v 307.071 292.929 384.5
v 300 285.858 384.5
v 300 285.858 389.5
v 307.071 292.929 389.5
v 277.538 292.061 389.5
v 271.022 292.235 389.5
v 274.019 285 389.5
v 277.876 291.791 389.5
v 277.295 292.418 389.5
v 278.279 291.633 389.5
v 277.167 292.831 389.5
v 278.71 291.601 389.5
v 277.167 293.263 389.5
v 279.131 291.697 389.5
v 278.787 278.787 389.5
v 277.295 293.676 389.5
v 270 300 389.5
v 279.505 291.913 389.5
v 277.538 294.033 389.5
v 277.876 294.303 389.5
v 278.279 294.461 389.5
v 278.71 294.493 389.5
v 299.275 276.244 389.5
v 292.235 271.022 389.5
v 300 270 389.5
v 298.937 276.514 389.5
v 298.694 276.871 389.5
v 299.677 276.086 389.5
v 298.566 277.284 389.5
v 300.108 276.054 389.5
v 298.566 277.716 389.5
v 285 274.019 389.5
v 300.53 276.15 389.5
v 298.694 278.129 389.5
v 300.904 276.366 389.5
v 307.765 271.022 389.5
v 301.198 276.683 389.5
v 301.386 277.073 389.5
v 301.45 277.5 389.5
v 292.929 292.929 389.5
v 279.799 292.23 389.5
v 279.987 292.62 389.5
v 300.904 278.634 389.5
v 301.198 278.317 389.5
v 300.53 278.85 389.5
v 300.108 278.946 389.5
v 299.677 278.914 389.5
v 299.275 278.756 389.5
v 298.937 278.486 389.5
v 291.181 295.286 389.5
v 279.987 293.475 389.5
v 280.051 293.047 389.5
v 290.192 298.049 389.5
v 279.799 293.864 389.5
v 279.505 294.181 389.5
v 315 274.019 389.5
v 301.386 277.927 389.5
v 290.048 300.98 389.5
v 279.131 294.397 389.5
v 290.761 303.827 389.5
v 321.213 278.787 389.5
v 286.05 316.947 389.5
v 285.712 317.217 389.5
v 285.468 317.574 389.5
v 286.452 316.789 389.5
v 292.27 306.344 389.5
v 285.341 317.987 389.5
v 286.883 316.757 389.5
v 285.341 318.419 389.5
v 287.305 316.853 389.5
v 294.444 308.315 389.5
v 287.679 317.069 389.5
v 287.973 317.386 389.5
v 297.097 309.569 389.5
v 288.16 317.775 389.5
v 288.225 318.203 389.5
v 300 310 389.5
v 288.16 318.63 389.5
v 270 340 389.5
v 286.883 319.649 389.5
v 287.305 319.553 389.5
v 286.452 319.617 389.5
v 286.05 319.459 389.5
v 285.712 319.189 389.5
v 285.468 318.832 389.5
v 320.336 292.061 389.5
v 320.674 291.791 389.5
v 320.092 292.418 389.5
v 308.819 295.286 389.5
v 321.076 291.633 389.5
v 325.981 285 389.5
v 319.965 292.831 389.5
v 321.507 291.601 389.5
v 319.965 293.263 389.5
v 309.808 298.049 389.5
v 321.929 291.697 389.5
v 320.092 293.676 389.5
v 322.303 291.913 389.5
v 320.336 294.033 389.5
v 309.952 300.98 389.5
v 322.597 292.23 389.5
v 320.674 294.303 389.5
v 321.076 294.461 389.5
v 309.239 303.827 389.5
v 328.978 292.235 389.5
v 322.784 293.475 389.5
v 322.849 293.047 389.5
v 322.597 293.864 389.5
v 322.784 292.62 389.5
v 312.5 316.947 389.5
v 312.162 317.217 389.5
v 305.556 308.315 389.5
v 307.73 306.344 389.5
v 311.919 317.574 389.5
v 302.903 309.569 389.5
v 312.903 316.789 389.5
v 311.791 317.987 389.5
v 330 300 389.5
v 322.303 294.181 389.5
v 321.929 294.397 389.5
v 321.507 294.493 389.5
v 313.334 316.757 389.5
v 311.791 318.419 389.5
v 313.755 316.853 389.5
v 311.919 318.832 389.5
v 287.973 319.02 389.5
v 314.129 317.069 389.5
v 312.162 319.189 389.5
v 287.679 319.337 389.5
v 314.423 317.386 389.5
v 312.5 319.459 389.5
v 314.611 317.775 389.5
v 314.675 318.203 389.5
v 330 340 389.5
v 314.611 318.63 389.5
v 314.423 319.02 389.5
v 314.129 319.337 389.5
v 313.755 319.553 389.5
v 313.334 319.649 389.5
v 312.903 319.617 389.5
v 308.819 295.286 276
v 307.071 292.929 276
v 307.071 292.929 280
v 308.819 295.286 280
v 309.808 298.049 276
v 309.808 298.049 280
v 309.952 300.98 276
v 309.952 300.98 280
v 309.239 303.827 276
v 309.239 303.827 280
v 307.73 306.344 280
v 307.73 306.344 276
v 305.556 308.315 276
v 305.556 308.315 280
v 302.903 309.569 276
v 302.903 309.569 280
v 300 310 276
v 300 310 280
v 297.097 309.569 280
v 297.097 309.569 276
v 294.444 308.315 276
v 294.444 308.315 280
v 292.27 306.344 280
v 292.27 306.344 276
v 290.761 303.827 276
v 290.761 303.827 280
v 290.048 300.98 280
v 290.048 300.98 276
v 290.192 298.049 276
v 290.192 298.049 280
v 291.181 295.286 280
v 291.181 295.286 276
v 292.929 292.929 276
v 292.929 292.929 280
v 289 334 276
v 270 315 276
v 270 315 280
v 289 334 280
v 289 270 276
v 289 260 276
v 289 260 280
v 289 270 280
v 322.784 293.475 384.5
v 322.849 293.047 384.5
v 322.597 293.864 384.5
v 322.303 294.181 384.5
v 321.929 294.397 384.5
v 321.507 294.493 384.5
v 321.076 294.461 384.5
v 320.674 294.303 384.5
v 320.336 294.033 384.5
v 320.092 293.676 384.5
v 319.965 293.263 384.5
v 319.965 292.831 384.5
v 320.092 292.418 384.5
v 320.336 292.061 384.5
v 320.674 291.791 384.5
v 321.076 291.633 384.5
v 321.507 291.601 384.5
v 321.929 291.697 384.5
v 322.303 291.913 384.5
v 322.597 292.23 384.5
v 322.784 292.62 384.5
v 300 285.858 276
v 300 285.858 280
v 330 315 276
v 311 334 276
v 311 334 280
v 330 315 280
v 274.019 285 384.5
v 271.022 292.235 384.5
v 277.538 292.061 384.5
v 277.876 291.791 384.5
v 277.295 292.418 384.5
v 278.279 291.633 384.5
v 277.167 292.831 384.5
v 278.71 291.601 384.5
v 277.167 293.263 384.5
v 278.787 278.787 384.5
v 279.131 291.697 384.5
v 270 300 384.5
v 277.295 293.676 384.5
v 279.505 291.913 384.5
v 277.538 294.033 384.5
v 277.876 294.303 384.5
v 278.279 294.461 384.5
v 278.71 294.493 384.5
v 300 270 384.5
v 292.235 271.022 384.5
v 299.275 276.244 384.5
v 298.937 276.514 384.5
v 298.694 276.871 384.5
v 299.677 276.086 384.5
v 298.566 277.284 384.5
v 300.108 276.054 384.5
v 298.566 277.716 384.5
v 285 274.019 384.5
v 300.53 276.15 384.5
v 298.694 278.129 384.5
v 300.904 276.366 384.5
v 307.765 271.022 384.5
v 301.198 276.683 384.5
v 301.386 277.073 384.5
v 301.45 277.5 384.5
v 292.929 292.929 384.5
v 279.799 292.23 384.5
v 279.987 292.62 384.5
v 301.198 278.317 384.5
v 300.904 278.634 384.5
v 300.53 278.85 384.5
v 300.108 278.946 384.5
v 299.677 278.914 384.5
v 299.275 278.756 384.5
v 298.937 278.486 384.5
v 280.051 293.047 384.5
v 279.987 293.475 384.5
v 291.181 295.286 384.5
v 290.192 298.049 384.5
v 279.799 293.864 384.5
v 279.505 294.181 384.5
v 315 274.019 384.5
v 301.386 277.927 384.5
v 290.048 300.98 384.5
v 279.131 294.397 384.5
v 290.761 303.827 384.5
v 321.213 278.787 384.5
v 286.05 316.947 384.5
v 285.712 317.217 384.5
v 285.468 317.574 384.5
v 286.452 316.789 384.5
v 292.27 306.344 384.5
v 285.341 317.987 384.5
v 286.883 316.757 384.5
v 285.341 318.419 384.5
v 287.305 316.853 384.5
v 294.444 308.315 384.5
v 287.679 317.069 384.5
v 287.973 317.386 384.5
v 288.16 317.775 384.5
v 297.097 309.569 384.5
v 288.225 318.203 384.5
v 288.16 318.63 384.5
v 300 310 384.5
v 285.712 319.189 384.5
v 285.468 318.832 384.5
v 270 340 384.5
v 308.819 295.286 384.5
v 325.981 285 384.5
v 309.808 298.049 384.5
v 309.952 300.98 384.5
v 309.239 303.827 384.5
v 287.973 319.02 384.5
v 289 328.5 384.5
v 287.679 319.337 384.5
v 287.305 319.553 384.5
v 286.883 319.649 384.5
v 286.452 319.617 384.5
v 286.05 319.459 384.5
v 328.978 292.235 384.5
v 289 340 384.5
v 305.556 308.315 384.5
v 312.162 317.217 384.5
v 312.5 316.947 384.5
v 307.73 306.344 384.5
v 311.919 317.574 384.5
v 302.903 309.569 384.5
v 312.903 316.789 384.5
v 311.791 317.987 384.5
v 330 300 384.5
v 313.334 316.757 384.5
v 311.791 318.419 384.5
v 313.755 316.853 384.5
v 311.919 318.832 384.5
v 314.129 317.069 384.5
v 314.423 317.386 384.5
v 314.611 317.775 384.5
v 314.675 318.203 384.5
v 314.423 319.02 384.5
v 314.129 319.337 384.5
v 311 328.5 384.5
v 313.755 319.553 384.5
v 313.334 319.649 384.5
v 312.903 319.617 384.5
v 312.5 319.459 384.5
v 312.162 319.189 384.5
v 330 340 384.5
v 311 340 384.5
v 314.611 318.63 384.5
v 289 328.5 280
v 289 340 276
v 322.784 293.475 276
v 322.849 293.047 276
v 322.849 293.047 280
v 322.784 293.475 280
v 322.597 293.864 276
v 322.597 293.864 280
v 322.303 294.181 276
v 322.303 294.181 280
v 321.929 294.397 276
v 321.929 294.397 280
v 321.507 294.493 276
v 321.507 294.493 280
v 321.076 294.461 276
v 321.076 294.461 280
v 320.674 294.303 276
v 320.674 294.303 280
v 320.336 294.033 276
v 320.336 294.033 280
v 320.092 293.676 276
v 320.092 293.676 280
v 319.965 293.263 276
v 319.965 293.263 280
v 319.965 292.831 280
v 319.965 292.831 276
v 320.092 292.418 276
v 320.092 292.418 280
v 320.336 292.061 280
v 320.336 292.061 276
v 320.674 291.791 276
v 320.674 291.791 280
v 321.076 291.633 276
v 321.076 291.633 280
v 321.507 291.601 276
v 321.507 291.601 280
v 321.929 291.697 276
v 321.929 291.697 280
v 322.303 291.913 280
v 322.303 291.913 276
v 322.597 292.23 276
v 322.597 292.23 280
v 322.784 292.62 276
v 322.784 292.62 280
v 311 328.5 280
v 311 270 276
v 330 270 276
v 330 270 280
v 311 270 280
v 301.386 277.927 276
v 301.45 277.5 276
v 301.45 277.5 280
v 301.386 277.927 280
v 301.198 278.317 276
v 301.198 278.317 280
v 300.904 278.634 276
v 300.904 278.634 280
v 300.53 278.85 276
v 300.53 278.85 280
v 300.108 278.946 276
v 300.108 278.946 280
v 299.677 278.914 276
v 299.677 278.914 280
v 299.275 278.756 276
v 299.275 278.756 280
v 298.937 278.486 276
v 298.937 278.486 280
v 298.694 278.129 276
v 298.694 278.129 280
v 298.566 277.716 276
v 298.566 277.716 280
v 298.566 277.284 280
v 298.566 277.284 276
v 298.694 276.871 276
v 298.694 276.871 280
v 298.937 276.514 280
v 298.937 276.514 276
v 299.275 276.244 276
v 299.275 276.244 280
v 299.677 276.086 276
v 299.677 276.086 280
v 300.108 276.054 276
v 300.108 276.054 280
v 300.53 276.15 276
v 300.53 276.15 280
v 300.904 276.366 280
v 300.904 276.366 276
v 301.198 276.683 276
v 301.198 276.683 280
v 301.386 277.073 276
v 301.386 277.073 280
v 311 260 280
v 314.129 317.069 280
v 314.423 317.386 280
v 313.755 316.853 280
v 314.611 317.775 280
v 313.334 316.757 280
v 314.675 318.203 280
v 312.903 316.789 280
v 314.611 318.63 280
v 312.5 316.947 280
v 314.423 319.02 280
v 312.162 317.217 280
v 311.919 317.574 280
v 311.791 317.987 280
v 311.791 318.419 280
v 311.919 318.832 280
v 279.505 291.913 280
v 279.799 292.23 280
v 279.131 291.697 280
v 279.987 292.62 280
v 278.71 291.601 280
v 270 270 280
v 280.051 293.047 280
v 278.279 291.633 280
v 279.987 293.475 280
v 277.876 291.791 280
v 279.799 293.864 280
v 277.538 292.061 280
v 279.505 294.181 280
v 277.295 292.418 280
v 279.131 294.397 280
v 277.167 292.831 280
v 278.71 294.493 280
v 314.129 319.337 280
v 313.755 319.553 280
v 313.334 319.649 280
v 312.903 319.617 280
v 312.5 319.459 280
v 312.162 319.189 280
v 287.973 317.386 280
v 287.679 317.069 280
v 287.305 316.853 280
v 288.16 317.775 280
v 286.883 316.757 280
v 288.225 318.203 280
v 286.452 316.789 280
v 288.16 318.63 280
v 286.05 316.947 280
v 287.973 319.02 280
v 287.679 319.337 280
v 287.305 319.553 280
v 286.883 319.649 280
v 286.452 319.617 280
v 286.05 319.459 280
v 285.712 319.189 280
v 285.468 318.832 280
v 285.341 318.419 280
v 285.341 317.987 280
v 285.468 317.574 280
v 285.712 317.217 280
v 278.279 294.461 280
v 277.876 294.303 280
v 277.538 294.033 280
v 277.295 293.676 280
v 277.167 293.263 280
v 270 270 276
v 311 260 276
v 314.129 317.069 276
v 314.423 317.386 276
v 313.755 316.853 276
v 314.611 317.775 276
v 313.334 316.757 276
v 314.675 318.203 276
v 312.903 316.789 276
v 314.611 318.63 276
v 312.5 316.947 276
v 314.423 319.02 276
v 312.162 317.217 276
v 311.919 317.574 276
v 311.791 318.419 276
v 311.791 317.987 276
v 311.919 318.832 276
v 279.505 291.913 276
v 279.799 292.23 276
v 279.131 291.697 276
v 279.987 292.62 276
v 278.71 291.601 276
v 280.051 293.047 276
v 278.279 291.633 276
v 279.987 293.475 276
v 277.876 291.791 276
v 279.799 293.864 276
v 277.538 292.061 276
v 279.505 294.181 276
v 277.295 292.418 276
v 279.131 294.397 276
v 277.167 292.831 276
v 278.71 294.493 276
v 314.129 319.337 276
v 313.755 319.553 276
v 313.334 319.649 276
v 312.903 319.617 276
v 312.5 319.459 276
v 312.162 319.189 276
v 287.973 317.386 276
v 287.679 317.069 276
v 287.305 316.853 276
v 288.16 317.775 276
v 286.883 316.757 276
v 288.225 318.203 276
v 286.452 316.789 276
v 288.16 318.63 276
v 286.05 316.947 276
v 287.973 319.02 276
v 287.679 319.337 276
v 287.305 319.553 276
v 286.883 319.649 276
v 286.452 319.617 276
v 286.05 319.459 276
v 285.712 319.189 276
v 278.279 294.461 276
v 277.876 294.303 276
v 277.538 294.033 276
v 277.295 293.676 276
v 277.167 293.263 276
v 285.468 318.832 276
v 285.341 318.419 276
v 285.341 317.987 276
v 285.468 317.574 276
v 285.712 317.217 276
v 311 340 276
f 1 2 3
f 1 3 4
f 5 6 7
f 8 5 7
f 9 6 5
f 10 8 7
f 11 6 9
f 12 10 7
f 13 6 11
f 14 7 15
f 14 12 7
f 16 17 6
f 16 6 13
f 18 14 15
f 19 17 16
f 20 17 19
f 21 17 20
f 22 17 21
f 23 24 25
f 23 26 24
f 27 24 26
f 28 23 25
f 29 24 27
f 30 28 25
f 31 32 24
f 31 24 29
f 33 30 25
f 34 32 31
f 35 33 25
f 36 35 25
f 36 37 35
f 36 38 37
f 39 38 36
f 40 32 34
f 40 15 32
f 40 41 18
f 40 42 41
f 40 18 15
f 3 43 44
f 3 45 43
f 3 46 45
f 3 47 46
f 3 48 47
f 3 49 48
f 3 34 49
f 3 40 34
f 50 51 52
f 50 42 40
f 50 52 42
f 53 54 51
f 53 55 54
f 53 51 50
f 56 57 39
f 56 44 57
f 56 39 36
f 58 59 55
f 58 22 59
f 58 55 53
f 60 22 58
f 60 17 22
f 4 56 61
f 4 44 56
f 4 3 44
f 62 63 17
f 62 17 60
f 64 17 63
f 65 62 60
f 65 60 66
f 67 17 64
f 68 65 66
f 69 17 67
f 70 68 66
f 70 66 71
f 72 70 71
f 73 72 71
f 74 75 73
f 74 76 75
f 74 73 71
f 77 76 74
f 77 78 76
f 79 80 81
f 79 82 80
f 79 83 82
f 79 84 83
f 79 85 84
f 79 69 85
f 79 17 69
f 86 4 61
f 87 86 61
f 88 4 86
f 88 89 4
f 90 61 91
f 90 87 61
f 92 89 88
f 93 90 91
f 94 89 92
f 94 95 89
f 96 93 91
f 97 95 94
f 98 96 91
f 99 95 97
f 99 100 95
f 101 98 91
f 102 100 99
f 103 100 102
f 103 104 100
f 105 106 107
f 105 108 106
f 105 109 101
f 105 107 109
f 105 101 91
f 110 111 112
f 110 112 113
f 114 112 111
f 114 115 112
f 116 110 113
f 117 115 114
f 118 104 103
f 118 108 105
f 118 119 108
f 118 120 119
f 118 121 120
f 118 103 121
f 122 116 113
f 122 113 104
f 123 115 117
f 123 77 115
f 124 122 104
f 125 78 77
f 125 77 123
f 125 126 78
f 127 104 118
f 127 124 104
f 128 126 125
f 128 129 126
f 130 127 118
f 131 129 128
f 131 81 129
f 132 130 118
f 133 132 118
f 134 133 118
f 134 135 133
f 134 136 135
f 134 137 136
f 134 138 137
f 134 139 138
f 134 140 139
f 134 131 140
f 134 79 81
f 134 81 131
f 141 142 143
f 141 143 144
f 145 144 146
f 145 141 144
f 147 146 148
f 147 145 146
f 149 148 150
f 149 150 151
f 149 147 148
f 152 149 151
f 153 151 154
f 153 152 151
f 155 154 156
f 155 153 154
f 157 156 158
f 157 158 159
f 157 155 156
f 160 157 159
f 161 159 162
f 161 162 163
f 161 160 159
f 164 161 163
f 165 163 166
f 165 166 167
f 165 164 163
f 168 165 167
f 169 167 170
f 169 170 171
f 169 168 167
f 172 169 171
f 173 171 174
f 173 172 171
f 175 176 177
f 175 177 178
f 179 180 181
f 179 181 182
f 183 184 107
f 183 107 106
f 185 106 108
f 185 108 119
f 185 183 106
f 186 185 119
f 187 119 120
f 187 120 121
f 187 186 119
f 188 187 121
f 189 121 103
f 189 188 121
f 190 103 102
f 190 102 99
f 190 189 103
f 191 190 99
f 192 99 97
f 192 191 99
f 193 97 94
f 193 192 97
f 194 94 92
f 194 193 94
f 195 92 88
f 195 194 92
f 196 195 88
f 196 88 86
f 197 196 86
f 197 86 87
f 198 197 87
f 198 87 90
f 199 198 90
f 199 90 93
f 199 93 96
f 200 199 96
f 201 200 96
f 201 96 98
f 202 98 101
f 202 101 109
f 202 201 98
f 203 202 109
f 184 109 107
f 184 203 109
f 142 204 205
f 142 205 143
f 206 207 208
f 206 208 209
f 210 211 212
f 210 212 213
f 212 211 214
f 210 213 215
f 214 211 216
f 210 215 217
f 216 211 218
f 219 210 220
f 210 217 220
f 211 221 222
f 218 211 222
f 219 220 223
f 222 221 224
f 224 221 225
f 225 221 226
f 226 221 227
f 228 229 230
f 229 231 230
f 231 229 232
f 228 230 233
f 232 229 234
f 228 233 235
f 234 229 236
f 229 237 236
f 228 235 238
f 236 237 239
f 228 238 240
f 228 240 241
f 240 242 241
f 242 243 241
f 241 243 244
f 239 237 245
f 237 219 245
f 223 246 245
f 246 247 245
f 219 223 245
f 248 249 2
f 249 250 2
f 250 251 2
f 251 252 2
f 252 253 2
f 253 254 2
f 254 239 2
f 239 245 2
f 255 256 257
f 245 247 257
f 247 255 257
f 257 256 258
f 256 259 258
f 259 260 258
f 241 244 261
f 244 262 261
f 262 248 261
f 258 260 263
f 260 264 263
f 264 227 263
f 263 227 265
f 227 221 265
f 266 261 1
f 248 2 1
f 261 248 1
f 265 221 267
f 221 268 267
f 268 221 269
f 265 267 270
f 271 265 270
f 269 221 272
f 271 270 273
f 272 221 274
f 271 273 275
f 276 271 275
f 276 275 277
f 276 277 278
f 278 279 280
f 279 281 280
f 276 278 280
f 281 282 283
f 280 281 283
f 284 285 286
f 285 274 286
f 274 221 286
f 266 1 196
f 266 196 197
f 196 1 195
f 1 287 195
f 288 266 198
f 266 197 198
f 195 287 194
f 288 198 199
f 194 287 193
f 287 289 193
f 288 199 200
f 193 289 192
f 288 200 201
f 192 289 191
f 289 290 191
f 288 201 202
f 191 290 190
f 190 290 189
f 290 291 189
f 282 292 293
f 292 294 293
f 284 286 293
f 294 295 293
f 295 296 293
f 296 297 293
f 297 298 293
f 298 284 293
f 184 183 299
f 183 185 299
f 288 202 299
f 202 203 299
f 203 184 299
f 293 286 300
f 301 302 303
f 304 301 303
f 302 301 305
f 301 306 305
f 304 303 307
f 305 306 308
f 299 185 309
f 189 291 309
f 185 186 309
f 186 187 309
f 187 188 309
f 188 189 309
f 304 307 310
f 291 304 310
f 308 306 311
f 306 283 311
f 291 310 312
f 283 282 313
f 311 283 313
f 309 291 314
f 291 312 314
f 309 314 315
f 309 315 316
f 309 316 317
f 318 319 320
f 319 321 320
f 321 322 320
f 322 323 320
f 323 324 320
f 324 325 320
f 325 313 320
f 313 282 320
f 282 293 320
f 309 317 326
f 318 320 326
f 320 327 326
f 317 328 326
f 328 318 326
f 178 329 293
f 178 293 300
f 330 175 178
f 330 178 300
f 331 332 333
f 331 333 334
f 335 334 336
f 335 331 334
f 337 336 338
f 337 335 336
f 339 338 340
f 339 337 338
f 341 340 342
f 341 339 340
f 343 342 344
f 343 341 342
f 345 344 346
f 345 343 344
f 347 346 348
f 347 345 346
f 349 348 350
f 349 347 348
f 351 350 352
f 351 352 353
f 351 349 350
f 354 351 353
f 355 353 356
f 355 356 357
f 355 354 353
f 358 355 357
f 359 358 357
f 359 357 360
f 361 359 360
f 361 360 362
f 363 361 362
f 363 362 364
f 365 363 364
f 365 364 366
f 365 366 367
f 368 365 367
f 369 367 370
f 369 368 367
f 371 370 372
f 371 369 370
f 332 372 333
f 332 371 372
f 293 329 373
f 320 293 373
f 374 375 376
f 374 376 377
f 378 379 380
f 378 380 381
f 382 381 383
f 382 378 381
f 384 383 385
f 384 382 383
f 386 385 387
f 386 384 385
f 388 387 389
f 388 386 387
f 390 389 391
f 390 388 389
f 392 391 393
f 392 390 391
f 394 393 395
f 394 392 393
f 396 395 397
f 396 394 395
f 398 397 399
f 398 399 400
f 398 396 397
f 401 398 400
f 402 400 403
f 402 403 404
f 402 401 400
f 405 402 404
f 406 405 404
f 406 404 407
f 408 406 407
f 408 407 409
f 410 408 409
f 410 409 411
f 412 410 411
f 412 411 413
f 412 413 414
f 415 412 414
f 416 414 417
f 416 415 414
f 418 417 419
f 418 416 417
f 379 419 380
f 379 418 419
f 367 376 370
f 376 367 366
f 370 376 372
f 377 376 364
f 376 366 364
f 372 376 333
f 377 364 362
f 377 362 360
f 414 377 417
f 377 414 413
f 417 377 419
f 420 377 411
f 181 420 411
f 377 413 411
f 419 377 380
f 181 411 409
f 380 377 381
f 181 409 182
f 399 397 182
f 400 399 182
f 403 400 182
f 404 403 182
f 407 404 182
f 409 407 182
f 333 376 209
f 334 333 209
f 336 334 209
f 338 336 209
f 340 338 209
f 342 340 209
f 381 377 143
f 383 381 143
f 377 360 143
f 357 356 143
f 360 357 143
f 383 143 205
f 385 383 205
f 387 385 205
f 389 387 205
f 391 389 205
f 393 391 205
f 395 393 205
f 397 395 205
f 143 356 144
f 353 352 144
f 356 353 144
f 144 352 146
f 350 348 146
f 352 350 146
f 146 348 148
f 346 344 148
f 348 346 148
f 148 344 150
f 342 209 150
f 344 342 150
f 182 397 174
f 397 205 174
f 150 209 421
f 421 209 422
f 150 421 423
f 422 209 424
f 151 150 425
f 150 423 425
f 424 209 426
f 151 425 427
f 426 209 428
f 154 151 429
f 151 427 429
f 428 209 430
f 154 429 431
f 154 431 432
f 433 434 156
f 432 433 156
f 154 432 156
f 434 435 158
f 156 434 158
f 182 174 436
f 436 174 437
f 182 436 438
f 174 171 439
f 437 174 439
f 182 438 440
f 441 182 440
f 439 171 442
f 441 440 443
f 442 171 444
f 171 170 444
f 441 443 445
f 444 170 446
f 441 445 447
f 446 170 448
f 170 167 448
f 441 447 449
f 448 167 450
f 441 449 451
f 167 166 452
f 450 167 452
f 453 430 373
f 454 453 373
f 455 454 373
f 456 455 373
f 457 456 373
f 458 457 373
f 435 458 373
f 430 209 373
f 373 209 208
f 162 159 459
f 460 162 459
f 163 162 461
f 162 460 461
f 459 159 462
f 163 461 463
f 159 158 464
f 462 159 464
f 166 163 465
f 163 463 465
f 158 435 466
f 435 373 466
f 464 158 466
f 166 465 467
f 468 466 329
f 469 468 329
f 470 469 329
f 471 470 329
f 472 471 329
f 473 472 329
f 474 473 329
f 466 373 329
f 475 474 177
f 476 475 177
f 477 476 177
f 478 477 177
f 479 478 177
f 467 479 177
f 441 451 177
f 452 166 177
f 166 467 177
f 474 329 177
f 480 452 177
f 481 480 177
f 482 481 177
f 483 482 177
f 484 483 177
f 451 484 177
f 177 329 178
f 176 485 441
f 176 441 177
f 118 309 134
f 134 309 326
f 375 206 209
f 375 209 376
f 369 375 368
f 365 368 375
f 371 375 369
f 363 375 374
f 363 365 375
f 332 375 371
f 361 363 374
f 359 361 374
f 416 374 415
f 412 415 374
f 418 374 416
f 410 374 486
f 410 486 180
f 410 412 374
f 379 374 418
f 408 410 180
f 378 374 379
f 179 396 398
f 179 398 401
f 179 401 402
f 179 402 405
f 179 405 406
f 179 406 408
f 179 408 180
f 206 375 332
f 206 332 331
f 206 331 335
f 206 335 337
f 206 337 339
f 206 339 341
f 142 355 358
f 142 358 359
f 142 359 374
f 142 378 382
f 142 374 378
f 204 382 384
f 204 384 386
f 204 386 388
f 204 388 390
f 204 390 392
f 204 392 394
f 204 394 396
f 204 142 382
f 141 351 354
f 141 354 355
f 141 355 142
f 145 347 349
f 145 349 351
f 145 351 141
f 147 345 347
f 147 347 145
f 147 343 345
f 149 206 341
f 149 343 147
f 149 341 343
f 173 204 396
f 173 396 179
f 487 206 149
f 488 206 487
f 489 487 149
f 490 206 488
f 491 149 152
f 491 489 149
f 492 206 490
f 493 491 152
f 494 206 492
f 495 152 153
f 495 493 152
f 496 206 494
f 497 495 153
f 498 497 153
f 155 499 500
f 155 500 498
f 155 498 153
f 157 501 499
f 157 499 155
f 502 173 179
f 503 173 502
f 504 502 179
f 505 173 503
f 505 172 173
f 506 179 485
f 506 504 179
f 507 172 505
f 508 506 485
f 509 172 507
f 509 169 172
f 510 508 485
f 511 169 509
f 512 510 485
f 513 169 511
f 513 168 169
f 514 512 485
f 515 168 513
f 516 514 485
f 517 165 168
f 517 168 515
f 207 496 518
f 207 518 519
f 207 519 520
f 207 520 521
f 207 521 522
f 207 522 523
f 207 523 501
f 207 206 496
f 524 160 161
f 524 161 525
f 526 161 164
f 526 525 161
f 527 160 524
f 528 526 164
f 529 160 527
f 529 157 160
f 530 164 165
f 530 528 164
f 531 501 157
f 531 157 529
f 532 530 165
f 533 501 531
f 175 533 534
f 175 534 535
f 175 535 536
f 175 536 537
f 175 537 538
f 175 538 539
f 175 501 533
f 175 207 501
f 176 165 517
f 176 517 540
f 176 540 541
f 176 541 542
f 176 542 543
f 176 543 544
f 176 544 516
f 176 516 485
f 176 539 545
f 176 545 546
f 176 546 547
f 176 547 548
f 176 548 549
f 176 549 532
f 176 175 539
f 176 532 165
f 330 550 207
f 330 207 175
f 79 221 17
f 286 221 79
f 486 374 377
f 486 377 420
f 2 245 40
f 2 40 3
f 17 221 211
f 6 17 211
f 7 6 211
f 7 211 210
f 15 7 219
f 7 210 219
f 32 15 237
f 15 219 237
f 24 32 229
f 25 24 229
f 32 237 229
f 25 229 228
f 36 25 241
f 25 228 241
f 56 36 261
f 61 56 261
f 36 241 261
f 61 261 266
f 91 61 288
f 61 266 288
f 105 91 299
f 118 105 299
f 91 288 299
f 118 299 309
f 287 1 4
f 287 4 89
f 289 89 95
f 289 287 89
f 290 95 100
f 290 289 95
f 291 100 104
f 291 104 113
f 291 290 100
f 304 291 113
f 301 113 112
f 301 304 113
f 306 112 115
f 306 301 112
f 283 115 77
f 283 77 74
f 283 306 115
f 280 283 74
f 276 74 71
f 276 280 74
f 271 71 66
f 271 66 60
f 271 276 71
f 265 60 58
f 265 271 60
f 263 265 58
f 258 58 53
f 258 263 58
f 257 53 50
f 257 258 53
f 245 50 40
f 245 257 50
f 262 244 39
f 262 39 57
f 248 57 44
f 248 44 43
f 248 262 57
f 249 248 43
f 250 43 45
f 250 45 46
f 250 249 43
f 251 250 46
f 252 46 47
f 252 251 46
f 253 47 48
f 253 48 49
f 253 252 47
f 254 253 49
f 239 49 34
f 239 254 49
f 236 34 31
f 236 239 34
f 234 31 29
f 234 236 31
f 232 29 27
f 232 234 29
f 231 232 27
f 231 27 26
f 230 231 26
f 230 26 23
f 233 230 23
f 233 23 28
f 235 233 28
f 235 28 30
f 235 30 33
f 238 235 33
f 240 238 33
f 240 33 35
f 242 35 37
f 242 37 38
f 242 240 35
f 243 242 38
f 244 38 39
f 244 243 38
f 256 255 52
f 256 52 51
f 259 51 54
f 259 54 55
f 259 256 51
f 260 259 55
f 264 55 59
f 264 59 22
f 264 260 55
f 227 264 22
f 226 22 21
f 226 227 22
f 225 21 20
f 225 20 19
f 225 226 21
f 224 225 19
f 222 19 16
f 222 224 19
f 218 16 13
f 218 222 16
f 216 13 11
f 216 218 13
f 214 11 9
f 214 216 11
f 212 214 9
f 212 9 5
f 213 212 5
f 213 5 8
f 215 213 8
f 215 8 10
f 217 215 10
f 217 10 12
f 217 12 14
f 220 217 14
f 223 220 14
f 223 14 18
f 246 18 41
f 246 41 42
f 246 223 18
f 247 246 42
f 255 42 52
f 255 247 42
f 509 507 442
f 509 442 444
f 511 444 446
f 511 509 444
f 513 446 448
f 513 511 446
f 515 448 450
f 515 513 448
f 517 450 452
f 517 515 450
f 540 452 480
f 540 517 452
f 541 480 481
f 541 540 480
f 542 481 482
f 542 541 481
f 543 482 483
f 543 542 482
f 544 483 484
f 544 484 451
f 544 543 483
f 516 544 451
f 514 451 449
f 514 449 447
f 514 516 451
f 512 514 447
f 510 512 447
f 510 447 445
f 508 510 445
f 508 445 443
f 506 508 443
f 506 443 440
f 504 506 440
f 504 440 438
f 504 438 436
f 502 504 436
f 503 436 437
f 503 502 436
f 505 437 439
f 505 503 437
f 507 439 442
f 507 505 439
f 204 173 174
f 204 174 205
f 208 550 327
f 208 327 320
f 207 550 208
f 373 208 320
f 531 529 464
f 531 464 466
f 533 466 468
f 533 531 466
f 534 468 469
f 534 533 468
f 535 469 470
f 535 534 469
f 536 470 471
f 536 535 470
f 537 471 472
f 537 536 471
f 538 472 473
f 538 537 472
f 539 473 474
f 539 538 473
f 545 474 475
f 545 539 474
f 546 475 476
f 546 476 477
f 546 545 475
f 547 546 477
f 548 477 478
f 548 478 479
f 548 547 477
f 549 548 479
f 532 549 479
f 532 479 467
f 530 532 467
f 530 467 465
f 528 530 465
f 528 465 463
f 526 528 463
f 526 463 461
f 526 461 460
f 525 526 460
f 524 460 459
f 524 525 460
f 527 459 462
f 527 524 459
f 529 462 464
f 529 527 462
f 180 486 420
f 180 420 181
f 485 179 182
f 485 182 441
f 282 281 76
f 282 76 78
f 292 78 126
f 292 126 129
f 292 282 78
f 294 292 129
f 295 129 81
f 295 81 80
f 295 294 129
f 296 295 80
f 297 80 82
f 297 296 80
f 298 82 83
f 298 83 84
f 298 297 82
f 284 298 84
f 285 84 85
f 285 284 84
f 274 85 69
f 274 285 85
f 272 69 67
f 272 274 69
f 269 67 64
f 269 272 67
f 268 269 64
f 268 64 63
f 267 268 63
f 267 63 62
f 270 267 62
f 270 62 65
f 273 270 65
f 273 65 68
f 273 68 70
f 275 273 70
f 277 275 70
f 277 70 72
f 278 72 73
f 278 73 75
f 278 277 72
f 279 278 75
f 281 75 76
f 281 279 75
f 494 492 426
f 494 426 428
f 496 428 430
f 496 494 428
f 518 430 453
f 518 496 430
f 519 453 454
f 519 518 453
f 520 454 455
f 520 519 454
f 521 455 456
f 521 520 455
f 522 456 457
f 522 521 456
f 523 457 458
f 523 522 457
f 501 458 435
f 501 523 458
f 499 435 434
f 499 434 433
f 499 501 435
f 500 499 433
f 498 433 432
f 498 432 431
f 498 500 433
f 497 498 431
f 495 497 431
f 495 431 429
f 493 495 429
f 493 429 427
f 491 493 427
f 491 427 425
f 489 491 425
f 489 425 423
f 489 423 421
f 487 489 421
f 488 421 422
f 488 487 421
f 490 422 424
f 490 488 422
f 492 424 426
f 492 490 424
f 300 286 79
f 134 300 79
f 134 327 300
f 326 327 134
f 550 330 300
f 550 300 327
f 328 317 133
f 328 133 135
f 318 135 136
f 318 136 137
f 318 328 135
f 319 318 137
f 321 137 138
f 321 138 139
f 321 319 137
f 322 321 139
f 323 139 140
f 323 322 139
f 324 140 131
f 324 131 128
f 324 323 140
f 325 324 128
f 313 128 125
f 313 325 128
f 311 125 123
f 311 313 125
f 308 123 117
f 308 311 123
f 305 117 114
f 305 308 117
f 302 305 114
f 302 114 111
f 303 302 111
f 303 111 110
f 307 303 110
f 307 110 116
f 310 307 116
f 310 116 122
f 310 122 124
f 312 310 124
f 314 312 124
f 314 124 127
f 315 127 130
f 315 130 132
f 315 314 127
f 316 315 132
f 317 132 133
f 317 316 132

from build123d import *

# Parameters (mm, degrees)
SKETCH1_R           = 30
BOSS_EXTRUDE1_DEPTH = 5
SKETCH2_W           = 60
SKETCH2_H           = 40
BOSS_EXTRUDE2_DEPTH = 5
SKETCH3_R           = 1.45
CUT_EXTRUDE1_DEPTH  = 5
SKETCH4_R           = 1.45
BOSS_EXTRUDE3_DEPTH = 4
SKETCH5_W           = 22
SKETCH5_H           = 11.5
BOSS_EXTRUDE4_DEPTH = 108.5


with BuildPart() as part:
    # Sketch1 → Boss-Extrude1 (new body)
    with BuildSketch(Plane.XY.offset(384.5)):
        with Locations((300, 300)):
            Circle(SKETCH1_R)
    extrude(amount=BOSS_EXTRUDE1_DEPTH)

    # Sketch2 → Boss-Extrude2 (add)
    with BuildSketch(Plane.XY.offset(384.5)):
        with Locations((300, 320)):
            Rectangle(SKETCH2_W, SKETCH2_H)
    extrude(amount=BOSS_EXTRUDE2_DEPTH)

    # Sketch3 → Cut-Extrude1 (cut)
    with BuildSketch(Plane.XY.offset(384.5)):
        with Locations((286.774831823, 318.202882373)):
            Circle(SKETCH3_R)
        with Locations((278.601228383, 293.047117627)):
            Circle(SKETCH3_R)
        with Locations((300, 277.5)):
            Circle(SKETCH3_R)
        with Locations((321.398771617, 293.047117627)):
            Circle(SKETCH3_R)
        with Locations((313.225168177, 318.202882373)):
            Circle(SKETCH3_R)
        with BuildLine():
            Line((292.928932188, 292.928932188), (300, 285.857864376))
            Line((300, 285.857864376), (307.071067812, 292.928932188))
            ThreePointArc((307.071067812, 292.928932188), (300, 310), (292.928932188, 292.928932188))
        make_face()
    extrude(amount=CUT_EXTRUDE1_DEPTH, mode=Mode.SUBTRACT)



with BuildPart() as body_2:
    # Sketch4 → Boss-Extrude3 (new body)
    with BuildSketch(Plane.XY.offset(276)):
        Polygon((289, 340), (311, 340), (311, 334), (330, 315), (330, 270), (311, 270), (311, 260), (289, 260), (289, 270), (270, 270), (270, 315), (289, 334), align=None)
        with Locations((286.774831823, 318.202882373)):
            Circle(SKETCH4_R, mode=Mode.SUBTRACT)
        with Locations((278.601228383, 293.047117627)):
            Circle(SKETCH4_R, mode=Mode.SUBTRACT)
        with Locations((300, 277.5)):
            Circle(SKETCH4_R, mode=Mode.SUBTRACT)
        with Locations((321.398771617, 293.047117627)):
            Circle(SKETCH4_R, mode=Mode.SUBTRACT)
        with Locations((313.225168177, 318.202882373)):
            Circle(SKETCH4_R, mode=Mode.SUBTRACT)
        with BuildLine():
            Line((292.928932188, 292.928932188), (300, 285.857864376))
            Line((300, 285.857864376), (307.071067812, 292.928932188))
            ThreePointArc((307.071067812, 292.928932188), (300, 310), (292.928932188, 292.928932188))
        make_face(mode=Mode.SUBTRACT)
    extrude(amount=BOSS_EXTRUDE3_DEPTH)


with BuildPart() as part_1:
    add(part.part)

    add(body_2.part)  # Boss-Extrude4 merges body 2
    # Sketch5 → Boss-Extrude4 (add)
    with BuildSketch(Plane.XY.offset(276)):
        with Locations((300, 334.25)):
            Rectangle(SKETCH5_W, SKETCH5_H)
    extrude(amount=BOSS_EXTRUDE4_DEPTH)


solid = part_1.part
